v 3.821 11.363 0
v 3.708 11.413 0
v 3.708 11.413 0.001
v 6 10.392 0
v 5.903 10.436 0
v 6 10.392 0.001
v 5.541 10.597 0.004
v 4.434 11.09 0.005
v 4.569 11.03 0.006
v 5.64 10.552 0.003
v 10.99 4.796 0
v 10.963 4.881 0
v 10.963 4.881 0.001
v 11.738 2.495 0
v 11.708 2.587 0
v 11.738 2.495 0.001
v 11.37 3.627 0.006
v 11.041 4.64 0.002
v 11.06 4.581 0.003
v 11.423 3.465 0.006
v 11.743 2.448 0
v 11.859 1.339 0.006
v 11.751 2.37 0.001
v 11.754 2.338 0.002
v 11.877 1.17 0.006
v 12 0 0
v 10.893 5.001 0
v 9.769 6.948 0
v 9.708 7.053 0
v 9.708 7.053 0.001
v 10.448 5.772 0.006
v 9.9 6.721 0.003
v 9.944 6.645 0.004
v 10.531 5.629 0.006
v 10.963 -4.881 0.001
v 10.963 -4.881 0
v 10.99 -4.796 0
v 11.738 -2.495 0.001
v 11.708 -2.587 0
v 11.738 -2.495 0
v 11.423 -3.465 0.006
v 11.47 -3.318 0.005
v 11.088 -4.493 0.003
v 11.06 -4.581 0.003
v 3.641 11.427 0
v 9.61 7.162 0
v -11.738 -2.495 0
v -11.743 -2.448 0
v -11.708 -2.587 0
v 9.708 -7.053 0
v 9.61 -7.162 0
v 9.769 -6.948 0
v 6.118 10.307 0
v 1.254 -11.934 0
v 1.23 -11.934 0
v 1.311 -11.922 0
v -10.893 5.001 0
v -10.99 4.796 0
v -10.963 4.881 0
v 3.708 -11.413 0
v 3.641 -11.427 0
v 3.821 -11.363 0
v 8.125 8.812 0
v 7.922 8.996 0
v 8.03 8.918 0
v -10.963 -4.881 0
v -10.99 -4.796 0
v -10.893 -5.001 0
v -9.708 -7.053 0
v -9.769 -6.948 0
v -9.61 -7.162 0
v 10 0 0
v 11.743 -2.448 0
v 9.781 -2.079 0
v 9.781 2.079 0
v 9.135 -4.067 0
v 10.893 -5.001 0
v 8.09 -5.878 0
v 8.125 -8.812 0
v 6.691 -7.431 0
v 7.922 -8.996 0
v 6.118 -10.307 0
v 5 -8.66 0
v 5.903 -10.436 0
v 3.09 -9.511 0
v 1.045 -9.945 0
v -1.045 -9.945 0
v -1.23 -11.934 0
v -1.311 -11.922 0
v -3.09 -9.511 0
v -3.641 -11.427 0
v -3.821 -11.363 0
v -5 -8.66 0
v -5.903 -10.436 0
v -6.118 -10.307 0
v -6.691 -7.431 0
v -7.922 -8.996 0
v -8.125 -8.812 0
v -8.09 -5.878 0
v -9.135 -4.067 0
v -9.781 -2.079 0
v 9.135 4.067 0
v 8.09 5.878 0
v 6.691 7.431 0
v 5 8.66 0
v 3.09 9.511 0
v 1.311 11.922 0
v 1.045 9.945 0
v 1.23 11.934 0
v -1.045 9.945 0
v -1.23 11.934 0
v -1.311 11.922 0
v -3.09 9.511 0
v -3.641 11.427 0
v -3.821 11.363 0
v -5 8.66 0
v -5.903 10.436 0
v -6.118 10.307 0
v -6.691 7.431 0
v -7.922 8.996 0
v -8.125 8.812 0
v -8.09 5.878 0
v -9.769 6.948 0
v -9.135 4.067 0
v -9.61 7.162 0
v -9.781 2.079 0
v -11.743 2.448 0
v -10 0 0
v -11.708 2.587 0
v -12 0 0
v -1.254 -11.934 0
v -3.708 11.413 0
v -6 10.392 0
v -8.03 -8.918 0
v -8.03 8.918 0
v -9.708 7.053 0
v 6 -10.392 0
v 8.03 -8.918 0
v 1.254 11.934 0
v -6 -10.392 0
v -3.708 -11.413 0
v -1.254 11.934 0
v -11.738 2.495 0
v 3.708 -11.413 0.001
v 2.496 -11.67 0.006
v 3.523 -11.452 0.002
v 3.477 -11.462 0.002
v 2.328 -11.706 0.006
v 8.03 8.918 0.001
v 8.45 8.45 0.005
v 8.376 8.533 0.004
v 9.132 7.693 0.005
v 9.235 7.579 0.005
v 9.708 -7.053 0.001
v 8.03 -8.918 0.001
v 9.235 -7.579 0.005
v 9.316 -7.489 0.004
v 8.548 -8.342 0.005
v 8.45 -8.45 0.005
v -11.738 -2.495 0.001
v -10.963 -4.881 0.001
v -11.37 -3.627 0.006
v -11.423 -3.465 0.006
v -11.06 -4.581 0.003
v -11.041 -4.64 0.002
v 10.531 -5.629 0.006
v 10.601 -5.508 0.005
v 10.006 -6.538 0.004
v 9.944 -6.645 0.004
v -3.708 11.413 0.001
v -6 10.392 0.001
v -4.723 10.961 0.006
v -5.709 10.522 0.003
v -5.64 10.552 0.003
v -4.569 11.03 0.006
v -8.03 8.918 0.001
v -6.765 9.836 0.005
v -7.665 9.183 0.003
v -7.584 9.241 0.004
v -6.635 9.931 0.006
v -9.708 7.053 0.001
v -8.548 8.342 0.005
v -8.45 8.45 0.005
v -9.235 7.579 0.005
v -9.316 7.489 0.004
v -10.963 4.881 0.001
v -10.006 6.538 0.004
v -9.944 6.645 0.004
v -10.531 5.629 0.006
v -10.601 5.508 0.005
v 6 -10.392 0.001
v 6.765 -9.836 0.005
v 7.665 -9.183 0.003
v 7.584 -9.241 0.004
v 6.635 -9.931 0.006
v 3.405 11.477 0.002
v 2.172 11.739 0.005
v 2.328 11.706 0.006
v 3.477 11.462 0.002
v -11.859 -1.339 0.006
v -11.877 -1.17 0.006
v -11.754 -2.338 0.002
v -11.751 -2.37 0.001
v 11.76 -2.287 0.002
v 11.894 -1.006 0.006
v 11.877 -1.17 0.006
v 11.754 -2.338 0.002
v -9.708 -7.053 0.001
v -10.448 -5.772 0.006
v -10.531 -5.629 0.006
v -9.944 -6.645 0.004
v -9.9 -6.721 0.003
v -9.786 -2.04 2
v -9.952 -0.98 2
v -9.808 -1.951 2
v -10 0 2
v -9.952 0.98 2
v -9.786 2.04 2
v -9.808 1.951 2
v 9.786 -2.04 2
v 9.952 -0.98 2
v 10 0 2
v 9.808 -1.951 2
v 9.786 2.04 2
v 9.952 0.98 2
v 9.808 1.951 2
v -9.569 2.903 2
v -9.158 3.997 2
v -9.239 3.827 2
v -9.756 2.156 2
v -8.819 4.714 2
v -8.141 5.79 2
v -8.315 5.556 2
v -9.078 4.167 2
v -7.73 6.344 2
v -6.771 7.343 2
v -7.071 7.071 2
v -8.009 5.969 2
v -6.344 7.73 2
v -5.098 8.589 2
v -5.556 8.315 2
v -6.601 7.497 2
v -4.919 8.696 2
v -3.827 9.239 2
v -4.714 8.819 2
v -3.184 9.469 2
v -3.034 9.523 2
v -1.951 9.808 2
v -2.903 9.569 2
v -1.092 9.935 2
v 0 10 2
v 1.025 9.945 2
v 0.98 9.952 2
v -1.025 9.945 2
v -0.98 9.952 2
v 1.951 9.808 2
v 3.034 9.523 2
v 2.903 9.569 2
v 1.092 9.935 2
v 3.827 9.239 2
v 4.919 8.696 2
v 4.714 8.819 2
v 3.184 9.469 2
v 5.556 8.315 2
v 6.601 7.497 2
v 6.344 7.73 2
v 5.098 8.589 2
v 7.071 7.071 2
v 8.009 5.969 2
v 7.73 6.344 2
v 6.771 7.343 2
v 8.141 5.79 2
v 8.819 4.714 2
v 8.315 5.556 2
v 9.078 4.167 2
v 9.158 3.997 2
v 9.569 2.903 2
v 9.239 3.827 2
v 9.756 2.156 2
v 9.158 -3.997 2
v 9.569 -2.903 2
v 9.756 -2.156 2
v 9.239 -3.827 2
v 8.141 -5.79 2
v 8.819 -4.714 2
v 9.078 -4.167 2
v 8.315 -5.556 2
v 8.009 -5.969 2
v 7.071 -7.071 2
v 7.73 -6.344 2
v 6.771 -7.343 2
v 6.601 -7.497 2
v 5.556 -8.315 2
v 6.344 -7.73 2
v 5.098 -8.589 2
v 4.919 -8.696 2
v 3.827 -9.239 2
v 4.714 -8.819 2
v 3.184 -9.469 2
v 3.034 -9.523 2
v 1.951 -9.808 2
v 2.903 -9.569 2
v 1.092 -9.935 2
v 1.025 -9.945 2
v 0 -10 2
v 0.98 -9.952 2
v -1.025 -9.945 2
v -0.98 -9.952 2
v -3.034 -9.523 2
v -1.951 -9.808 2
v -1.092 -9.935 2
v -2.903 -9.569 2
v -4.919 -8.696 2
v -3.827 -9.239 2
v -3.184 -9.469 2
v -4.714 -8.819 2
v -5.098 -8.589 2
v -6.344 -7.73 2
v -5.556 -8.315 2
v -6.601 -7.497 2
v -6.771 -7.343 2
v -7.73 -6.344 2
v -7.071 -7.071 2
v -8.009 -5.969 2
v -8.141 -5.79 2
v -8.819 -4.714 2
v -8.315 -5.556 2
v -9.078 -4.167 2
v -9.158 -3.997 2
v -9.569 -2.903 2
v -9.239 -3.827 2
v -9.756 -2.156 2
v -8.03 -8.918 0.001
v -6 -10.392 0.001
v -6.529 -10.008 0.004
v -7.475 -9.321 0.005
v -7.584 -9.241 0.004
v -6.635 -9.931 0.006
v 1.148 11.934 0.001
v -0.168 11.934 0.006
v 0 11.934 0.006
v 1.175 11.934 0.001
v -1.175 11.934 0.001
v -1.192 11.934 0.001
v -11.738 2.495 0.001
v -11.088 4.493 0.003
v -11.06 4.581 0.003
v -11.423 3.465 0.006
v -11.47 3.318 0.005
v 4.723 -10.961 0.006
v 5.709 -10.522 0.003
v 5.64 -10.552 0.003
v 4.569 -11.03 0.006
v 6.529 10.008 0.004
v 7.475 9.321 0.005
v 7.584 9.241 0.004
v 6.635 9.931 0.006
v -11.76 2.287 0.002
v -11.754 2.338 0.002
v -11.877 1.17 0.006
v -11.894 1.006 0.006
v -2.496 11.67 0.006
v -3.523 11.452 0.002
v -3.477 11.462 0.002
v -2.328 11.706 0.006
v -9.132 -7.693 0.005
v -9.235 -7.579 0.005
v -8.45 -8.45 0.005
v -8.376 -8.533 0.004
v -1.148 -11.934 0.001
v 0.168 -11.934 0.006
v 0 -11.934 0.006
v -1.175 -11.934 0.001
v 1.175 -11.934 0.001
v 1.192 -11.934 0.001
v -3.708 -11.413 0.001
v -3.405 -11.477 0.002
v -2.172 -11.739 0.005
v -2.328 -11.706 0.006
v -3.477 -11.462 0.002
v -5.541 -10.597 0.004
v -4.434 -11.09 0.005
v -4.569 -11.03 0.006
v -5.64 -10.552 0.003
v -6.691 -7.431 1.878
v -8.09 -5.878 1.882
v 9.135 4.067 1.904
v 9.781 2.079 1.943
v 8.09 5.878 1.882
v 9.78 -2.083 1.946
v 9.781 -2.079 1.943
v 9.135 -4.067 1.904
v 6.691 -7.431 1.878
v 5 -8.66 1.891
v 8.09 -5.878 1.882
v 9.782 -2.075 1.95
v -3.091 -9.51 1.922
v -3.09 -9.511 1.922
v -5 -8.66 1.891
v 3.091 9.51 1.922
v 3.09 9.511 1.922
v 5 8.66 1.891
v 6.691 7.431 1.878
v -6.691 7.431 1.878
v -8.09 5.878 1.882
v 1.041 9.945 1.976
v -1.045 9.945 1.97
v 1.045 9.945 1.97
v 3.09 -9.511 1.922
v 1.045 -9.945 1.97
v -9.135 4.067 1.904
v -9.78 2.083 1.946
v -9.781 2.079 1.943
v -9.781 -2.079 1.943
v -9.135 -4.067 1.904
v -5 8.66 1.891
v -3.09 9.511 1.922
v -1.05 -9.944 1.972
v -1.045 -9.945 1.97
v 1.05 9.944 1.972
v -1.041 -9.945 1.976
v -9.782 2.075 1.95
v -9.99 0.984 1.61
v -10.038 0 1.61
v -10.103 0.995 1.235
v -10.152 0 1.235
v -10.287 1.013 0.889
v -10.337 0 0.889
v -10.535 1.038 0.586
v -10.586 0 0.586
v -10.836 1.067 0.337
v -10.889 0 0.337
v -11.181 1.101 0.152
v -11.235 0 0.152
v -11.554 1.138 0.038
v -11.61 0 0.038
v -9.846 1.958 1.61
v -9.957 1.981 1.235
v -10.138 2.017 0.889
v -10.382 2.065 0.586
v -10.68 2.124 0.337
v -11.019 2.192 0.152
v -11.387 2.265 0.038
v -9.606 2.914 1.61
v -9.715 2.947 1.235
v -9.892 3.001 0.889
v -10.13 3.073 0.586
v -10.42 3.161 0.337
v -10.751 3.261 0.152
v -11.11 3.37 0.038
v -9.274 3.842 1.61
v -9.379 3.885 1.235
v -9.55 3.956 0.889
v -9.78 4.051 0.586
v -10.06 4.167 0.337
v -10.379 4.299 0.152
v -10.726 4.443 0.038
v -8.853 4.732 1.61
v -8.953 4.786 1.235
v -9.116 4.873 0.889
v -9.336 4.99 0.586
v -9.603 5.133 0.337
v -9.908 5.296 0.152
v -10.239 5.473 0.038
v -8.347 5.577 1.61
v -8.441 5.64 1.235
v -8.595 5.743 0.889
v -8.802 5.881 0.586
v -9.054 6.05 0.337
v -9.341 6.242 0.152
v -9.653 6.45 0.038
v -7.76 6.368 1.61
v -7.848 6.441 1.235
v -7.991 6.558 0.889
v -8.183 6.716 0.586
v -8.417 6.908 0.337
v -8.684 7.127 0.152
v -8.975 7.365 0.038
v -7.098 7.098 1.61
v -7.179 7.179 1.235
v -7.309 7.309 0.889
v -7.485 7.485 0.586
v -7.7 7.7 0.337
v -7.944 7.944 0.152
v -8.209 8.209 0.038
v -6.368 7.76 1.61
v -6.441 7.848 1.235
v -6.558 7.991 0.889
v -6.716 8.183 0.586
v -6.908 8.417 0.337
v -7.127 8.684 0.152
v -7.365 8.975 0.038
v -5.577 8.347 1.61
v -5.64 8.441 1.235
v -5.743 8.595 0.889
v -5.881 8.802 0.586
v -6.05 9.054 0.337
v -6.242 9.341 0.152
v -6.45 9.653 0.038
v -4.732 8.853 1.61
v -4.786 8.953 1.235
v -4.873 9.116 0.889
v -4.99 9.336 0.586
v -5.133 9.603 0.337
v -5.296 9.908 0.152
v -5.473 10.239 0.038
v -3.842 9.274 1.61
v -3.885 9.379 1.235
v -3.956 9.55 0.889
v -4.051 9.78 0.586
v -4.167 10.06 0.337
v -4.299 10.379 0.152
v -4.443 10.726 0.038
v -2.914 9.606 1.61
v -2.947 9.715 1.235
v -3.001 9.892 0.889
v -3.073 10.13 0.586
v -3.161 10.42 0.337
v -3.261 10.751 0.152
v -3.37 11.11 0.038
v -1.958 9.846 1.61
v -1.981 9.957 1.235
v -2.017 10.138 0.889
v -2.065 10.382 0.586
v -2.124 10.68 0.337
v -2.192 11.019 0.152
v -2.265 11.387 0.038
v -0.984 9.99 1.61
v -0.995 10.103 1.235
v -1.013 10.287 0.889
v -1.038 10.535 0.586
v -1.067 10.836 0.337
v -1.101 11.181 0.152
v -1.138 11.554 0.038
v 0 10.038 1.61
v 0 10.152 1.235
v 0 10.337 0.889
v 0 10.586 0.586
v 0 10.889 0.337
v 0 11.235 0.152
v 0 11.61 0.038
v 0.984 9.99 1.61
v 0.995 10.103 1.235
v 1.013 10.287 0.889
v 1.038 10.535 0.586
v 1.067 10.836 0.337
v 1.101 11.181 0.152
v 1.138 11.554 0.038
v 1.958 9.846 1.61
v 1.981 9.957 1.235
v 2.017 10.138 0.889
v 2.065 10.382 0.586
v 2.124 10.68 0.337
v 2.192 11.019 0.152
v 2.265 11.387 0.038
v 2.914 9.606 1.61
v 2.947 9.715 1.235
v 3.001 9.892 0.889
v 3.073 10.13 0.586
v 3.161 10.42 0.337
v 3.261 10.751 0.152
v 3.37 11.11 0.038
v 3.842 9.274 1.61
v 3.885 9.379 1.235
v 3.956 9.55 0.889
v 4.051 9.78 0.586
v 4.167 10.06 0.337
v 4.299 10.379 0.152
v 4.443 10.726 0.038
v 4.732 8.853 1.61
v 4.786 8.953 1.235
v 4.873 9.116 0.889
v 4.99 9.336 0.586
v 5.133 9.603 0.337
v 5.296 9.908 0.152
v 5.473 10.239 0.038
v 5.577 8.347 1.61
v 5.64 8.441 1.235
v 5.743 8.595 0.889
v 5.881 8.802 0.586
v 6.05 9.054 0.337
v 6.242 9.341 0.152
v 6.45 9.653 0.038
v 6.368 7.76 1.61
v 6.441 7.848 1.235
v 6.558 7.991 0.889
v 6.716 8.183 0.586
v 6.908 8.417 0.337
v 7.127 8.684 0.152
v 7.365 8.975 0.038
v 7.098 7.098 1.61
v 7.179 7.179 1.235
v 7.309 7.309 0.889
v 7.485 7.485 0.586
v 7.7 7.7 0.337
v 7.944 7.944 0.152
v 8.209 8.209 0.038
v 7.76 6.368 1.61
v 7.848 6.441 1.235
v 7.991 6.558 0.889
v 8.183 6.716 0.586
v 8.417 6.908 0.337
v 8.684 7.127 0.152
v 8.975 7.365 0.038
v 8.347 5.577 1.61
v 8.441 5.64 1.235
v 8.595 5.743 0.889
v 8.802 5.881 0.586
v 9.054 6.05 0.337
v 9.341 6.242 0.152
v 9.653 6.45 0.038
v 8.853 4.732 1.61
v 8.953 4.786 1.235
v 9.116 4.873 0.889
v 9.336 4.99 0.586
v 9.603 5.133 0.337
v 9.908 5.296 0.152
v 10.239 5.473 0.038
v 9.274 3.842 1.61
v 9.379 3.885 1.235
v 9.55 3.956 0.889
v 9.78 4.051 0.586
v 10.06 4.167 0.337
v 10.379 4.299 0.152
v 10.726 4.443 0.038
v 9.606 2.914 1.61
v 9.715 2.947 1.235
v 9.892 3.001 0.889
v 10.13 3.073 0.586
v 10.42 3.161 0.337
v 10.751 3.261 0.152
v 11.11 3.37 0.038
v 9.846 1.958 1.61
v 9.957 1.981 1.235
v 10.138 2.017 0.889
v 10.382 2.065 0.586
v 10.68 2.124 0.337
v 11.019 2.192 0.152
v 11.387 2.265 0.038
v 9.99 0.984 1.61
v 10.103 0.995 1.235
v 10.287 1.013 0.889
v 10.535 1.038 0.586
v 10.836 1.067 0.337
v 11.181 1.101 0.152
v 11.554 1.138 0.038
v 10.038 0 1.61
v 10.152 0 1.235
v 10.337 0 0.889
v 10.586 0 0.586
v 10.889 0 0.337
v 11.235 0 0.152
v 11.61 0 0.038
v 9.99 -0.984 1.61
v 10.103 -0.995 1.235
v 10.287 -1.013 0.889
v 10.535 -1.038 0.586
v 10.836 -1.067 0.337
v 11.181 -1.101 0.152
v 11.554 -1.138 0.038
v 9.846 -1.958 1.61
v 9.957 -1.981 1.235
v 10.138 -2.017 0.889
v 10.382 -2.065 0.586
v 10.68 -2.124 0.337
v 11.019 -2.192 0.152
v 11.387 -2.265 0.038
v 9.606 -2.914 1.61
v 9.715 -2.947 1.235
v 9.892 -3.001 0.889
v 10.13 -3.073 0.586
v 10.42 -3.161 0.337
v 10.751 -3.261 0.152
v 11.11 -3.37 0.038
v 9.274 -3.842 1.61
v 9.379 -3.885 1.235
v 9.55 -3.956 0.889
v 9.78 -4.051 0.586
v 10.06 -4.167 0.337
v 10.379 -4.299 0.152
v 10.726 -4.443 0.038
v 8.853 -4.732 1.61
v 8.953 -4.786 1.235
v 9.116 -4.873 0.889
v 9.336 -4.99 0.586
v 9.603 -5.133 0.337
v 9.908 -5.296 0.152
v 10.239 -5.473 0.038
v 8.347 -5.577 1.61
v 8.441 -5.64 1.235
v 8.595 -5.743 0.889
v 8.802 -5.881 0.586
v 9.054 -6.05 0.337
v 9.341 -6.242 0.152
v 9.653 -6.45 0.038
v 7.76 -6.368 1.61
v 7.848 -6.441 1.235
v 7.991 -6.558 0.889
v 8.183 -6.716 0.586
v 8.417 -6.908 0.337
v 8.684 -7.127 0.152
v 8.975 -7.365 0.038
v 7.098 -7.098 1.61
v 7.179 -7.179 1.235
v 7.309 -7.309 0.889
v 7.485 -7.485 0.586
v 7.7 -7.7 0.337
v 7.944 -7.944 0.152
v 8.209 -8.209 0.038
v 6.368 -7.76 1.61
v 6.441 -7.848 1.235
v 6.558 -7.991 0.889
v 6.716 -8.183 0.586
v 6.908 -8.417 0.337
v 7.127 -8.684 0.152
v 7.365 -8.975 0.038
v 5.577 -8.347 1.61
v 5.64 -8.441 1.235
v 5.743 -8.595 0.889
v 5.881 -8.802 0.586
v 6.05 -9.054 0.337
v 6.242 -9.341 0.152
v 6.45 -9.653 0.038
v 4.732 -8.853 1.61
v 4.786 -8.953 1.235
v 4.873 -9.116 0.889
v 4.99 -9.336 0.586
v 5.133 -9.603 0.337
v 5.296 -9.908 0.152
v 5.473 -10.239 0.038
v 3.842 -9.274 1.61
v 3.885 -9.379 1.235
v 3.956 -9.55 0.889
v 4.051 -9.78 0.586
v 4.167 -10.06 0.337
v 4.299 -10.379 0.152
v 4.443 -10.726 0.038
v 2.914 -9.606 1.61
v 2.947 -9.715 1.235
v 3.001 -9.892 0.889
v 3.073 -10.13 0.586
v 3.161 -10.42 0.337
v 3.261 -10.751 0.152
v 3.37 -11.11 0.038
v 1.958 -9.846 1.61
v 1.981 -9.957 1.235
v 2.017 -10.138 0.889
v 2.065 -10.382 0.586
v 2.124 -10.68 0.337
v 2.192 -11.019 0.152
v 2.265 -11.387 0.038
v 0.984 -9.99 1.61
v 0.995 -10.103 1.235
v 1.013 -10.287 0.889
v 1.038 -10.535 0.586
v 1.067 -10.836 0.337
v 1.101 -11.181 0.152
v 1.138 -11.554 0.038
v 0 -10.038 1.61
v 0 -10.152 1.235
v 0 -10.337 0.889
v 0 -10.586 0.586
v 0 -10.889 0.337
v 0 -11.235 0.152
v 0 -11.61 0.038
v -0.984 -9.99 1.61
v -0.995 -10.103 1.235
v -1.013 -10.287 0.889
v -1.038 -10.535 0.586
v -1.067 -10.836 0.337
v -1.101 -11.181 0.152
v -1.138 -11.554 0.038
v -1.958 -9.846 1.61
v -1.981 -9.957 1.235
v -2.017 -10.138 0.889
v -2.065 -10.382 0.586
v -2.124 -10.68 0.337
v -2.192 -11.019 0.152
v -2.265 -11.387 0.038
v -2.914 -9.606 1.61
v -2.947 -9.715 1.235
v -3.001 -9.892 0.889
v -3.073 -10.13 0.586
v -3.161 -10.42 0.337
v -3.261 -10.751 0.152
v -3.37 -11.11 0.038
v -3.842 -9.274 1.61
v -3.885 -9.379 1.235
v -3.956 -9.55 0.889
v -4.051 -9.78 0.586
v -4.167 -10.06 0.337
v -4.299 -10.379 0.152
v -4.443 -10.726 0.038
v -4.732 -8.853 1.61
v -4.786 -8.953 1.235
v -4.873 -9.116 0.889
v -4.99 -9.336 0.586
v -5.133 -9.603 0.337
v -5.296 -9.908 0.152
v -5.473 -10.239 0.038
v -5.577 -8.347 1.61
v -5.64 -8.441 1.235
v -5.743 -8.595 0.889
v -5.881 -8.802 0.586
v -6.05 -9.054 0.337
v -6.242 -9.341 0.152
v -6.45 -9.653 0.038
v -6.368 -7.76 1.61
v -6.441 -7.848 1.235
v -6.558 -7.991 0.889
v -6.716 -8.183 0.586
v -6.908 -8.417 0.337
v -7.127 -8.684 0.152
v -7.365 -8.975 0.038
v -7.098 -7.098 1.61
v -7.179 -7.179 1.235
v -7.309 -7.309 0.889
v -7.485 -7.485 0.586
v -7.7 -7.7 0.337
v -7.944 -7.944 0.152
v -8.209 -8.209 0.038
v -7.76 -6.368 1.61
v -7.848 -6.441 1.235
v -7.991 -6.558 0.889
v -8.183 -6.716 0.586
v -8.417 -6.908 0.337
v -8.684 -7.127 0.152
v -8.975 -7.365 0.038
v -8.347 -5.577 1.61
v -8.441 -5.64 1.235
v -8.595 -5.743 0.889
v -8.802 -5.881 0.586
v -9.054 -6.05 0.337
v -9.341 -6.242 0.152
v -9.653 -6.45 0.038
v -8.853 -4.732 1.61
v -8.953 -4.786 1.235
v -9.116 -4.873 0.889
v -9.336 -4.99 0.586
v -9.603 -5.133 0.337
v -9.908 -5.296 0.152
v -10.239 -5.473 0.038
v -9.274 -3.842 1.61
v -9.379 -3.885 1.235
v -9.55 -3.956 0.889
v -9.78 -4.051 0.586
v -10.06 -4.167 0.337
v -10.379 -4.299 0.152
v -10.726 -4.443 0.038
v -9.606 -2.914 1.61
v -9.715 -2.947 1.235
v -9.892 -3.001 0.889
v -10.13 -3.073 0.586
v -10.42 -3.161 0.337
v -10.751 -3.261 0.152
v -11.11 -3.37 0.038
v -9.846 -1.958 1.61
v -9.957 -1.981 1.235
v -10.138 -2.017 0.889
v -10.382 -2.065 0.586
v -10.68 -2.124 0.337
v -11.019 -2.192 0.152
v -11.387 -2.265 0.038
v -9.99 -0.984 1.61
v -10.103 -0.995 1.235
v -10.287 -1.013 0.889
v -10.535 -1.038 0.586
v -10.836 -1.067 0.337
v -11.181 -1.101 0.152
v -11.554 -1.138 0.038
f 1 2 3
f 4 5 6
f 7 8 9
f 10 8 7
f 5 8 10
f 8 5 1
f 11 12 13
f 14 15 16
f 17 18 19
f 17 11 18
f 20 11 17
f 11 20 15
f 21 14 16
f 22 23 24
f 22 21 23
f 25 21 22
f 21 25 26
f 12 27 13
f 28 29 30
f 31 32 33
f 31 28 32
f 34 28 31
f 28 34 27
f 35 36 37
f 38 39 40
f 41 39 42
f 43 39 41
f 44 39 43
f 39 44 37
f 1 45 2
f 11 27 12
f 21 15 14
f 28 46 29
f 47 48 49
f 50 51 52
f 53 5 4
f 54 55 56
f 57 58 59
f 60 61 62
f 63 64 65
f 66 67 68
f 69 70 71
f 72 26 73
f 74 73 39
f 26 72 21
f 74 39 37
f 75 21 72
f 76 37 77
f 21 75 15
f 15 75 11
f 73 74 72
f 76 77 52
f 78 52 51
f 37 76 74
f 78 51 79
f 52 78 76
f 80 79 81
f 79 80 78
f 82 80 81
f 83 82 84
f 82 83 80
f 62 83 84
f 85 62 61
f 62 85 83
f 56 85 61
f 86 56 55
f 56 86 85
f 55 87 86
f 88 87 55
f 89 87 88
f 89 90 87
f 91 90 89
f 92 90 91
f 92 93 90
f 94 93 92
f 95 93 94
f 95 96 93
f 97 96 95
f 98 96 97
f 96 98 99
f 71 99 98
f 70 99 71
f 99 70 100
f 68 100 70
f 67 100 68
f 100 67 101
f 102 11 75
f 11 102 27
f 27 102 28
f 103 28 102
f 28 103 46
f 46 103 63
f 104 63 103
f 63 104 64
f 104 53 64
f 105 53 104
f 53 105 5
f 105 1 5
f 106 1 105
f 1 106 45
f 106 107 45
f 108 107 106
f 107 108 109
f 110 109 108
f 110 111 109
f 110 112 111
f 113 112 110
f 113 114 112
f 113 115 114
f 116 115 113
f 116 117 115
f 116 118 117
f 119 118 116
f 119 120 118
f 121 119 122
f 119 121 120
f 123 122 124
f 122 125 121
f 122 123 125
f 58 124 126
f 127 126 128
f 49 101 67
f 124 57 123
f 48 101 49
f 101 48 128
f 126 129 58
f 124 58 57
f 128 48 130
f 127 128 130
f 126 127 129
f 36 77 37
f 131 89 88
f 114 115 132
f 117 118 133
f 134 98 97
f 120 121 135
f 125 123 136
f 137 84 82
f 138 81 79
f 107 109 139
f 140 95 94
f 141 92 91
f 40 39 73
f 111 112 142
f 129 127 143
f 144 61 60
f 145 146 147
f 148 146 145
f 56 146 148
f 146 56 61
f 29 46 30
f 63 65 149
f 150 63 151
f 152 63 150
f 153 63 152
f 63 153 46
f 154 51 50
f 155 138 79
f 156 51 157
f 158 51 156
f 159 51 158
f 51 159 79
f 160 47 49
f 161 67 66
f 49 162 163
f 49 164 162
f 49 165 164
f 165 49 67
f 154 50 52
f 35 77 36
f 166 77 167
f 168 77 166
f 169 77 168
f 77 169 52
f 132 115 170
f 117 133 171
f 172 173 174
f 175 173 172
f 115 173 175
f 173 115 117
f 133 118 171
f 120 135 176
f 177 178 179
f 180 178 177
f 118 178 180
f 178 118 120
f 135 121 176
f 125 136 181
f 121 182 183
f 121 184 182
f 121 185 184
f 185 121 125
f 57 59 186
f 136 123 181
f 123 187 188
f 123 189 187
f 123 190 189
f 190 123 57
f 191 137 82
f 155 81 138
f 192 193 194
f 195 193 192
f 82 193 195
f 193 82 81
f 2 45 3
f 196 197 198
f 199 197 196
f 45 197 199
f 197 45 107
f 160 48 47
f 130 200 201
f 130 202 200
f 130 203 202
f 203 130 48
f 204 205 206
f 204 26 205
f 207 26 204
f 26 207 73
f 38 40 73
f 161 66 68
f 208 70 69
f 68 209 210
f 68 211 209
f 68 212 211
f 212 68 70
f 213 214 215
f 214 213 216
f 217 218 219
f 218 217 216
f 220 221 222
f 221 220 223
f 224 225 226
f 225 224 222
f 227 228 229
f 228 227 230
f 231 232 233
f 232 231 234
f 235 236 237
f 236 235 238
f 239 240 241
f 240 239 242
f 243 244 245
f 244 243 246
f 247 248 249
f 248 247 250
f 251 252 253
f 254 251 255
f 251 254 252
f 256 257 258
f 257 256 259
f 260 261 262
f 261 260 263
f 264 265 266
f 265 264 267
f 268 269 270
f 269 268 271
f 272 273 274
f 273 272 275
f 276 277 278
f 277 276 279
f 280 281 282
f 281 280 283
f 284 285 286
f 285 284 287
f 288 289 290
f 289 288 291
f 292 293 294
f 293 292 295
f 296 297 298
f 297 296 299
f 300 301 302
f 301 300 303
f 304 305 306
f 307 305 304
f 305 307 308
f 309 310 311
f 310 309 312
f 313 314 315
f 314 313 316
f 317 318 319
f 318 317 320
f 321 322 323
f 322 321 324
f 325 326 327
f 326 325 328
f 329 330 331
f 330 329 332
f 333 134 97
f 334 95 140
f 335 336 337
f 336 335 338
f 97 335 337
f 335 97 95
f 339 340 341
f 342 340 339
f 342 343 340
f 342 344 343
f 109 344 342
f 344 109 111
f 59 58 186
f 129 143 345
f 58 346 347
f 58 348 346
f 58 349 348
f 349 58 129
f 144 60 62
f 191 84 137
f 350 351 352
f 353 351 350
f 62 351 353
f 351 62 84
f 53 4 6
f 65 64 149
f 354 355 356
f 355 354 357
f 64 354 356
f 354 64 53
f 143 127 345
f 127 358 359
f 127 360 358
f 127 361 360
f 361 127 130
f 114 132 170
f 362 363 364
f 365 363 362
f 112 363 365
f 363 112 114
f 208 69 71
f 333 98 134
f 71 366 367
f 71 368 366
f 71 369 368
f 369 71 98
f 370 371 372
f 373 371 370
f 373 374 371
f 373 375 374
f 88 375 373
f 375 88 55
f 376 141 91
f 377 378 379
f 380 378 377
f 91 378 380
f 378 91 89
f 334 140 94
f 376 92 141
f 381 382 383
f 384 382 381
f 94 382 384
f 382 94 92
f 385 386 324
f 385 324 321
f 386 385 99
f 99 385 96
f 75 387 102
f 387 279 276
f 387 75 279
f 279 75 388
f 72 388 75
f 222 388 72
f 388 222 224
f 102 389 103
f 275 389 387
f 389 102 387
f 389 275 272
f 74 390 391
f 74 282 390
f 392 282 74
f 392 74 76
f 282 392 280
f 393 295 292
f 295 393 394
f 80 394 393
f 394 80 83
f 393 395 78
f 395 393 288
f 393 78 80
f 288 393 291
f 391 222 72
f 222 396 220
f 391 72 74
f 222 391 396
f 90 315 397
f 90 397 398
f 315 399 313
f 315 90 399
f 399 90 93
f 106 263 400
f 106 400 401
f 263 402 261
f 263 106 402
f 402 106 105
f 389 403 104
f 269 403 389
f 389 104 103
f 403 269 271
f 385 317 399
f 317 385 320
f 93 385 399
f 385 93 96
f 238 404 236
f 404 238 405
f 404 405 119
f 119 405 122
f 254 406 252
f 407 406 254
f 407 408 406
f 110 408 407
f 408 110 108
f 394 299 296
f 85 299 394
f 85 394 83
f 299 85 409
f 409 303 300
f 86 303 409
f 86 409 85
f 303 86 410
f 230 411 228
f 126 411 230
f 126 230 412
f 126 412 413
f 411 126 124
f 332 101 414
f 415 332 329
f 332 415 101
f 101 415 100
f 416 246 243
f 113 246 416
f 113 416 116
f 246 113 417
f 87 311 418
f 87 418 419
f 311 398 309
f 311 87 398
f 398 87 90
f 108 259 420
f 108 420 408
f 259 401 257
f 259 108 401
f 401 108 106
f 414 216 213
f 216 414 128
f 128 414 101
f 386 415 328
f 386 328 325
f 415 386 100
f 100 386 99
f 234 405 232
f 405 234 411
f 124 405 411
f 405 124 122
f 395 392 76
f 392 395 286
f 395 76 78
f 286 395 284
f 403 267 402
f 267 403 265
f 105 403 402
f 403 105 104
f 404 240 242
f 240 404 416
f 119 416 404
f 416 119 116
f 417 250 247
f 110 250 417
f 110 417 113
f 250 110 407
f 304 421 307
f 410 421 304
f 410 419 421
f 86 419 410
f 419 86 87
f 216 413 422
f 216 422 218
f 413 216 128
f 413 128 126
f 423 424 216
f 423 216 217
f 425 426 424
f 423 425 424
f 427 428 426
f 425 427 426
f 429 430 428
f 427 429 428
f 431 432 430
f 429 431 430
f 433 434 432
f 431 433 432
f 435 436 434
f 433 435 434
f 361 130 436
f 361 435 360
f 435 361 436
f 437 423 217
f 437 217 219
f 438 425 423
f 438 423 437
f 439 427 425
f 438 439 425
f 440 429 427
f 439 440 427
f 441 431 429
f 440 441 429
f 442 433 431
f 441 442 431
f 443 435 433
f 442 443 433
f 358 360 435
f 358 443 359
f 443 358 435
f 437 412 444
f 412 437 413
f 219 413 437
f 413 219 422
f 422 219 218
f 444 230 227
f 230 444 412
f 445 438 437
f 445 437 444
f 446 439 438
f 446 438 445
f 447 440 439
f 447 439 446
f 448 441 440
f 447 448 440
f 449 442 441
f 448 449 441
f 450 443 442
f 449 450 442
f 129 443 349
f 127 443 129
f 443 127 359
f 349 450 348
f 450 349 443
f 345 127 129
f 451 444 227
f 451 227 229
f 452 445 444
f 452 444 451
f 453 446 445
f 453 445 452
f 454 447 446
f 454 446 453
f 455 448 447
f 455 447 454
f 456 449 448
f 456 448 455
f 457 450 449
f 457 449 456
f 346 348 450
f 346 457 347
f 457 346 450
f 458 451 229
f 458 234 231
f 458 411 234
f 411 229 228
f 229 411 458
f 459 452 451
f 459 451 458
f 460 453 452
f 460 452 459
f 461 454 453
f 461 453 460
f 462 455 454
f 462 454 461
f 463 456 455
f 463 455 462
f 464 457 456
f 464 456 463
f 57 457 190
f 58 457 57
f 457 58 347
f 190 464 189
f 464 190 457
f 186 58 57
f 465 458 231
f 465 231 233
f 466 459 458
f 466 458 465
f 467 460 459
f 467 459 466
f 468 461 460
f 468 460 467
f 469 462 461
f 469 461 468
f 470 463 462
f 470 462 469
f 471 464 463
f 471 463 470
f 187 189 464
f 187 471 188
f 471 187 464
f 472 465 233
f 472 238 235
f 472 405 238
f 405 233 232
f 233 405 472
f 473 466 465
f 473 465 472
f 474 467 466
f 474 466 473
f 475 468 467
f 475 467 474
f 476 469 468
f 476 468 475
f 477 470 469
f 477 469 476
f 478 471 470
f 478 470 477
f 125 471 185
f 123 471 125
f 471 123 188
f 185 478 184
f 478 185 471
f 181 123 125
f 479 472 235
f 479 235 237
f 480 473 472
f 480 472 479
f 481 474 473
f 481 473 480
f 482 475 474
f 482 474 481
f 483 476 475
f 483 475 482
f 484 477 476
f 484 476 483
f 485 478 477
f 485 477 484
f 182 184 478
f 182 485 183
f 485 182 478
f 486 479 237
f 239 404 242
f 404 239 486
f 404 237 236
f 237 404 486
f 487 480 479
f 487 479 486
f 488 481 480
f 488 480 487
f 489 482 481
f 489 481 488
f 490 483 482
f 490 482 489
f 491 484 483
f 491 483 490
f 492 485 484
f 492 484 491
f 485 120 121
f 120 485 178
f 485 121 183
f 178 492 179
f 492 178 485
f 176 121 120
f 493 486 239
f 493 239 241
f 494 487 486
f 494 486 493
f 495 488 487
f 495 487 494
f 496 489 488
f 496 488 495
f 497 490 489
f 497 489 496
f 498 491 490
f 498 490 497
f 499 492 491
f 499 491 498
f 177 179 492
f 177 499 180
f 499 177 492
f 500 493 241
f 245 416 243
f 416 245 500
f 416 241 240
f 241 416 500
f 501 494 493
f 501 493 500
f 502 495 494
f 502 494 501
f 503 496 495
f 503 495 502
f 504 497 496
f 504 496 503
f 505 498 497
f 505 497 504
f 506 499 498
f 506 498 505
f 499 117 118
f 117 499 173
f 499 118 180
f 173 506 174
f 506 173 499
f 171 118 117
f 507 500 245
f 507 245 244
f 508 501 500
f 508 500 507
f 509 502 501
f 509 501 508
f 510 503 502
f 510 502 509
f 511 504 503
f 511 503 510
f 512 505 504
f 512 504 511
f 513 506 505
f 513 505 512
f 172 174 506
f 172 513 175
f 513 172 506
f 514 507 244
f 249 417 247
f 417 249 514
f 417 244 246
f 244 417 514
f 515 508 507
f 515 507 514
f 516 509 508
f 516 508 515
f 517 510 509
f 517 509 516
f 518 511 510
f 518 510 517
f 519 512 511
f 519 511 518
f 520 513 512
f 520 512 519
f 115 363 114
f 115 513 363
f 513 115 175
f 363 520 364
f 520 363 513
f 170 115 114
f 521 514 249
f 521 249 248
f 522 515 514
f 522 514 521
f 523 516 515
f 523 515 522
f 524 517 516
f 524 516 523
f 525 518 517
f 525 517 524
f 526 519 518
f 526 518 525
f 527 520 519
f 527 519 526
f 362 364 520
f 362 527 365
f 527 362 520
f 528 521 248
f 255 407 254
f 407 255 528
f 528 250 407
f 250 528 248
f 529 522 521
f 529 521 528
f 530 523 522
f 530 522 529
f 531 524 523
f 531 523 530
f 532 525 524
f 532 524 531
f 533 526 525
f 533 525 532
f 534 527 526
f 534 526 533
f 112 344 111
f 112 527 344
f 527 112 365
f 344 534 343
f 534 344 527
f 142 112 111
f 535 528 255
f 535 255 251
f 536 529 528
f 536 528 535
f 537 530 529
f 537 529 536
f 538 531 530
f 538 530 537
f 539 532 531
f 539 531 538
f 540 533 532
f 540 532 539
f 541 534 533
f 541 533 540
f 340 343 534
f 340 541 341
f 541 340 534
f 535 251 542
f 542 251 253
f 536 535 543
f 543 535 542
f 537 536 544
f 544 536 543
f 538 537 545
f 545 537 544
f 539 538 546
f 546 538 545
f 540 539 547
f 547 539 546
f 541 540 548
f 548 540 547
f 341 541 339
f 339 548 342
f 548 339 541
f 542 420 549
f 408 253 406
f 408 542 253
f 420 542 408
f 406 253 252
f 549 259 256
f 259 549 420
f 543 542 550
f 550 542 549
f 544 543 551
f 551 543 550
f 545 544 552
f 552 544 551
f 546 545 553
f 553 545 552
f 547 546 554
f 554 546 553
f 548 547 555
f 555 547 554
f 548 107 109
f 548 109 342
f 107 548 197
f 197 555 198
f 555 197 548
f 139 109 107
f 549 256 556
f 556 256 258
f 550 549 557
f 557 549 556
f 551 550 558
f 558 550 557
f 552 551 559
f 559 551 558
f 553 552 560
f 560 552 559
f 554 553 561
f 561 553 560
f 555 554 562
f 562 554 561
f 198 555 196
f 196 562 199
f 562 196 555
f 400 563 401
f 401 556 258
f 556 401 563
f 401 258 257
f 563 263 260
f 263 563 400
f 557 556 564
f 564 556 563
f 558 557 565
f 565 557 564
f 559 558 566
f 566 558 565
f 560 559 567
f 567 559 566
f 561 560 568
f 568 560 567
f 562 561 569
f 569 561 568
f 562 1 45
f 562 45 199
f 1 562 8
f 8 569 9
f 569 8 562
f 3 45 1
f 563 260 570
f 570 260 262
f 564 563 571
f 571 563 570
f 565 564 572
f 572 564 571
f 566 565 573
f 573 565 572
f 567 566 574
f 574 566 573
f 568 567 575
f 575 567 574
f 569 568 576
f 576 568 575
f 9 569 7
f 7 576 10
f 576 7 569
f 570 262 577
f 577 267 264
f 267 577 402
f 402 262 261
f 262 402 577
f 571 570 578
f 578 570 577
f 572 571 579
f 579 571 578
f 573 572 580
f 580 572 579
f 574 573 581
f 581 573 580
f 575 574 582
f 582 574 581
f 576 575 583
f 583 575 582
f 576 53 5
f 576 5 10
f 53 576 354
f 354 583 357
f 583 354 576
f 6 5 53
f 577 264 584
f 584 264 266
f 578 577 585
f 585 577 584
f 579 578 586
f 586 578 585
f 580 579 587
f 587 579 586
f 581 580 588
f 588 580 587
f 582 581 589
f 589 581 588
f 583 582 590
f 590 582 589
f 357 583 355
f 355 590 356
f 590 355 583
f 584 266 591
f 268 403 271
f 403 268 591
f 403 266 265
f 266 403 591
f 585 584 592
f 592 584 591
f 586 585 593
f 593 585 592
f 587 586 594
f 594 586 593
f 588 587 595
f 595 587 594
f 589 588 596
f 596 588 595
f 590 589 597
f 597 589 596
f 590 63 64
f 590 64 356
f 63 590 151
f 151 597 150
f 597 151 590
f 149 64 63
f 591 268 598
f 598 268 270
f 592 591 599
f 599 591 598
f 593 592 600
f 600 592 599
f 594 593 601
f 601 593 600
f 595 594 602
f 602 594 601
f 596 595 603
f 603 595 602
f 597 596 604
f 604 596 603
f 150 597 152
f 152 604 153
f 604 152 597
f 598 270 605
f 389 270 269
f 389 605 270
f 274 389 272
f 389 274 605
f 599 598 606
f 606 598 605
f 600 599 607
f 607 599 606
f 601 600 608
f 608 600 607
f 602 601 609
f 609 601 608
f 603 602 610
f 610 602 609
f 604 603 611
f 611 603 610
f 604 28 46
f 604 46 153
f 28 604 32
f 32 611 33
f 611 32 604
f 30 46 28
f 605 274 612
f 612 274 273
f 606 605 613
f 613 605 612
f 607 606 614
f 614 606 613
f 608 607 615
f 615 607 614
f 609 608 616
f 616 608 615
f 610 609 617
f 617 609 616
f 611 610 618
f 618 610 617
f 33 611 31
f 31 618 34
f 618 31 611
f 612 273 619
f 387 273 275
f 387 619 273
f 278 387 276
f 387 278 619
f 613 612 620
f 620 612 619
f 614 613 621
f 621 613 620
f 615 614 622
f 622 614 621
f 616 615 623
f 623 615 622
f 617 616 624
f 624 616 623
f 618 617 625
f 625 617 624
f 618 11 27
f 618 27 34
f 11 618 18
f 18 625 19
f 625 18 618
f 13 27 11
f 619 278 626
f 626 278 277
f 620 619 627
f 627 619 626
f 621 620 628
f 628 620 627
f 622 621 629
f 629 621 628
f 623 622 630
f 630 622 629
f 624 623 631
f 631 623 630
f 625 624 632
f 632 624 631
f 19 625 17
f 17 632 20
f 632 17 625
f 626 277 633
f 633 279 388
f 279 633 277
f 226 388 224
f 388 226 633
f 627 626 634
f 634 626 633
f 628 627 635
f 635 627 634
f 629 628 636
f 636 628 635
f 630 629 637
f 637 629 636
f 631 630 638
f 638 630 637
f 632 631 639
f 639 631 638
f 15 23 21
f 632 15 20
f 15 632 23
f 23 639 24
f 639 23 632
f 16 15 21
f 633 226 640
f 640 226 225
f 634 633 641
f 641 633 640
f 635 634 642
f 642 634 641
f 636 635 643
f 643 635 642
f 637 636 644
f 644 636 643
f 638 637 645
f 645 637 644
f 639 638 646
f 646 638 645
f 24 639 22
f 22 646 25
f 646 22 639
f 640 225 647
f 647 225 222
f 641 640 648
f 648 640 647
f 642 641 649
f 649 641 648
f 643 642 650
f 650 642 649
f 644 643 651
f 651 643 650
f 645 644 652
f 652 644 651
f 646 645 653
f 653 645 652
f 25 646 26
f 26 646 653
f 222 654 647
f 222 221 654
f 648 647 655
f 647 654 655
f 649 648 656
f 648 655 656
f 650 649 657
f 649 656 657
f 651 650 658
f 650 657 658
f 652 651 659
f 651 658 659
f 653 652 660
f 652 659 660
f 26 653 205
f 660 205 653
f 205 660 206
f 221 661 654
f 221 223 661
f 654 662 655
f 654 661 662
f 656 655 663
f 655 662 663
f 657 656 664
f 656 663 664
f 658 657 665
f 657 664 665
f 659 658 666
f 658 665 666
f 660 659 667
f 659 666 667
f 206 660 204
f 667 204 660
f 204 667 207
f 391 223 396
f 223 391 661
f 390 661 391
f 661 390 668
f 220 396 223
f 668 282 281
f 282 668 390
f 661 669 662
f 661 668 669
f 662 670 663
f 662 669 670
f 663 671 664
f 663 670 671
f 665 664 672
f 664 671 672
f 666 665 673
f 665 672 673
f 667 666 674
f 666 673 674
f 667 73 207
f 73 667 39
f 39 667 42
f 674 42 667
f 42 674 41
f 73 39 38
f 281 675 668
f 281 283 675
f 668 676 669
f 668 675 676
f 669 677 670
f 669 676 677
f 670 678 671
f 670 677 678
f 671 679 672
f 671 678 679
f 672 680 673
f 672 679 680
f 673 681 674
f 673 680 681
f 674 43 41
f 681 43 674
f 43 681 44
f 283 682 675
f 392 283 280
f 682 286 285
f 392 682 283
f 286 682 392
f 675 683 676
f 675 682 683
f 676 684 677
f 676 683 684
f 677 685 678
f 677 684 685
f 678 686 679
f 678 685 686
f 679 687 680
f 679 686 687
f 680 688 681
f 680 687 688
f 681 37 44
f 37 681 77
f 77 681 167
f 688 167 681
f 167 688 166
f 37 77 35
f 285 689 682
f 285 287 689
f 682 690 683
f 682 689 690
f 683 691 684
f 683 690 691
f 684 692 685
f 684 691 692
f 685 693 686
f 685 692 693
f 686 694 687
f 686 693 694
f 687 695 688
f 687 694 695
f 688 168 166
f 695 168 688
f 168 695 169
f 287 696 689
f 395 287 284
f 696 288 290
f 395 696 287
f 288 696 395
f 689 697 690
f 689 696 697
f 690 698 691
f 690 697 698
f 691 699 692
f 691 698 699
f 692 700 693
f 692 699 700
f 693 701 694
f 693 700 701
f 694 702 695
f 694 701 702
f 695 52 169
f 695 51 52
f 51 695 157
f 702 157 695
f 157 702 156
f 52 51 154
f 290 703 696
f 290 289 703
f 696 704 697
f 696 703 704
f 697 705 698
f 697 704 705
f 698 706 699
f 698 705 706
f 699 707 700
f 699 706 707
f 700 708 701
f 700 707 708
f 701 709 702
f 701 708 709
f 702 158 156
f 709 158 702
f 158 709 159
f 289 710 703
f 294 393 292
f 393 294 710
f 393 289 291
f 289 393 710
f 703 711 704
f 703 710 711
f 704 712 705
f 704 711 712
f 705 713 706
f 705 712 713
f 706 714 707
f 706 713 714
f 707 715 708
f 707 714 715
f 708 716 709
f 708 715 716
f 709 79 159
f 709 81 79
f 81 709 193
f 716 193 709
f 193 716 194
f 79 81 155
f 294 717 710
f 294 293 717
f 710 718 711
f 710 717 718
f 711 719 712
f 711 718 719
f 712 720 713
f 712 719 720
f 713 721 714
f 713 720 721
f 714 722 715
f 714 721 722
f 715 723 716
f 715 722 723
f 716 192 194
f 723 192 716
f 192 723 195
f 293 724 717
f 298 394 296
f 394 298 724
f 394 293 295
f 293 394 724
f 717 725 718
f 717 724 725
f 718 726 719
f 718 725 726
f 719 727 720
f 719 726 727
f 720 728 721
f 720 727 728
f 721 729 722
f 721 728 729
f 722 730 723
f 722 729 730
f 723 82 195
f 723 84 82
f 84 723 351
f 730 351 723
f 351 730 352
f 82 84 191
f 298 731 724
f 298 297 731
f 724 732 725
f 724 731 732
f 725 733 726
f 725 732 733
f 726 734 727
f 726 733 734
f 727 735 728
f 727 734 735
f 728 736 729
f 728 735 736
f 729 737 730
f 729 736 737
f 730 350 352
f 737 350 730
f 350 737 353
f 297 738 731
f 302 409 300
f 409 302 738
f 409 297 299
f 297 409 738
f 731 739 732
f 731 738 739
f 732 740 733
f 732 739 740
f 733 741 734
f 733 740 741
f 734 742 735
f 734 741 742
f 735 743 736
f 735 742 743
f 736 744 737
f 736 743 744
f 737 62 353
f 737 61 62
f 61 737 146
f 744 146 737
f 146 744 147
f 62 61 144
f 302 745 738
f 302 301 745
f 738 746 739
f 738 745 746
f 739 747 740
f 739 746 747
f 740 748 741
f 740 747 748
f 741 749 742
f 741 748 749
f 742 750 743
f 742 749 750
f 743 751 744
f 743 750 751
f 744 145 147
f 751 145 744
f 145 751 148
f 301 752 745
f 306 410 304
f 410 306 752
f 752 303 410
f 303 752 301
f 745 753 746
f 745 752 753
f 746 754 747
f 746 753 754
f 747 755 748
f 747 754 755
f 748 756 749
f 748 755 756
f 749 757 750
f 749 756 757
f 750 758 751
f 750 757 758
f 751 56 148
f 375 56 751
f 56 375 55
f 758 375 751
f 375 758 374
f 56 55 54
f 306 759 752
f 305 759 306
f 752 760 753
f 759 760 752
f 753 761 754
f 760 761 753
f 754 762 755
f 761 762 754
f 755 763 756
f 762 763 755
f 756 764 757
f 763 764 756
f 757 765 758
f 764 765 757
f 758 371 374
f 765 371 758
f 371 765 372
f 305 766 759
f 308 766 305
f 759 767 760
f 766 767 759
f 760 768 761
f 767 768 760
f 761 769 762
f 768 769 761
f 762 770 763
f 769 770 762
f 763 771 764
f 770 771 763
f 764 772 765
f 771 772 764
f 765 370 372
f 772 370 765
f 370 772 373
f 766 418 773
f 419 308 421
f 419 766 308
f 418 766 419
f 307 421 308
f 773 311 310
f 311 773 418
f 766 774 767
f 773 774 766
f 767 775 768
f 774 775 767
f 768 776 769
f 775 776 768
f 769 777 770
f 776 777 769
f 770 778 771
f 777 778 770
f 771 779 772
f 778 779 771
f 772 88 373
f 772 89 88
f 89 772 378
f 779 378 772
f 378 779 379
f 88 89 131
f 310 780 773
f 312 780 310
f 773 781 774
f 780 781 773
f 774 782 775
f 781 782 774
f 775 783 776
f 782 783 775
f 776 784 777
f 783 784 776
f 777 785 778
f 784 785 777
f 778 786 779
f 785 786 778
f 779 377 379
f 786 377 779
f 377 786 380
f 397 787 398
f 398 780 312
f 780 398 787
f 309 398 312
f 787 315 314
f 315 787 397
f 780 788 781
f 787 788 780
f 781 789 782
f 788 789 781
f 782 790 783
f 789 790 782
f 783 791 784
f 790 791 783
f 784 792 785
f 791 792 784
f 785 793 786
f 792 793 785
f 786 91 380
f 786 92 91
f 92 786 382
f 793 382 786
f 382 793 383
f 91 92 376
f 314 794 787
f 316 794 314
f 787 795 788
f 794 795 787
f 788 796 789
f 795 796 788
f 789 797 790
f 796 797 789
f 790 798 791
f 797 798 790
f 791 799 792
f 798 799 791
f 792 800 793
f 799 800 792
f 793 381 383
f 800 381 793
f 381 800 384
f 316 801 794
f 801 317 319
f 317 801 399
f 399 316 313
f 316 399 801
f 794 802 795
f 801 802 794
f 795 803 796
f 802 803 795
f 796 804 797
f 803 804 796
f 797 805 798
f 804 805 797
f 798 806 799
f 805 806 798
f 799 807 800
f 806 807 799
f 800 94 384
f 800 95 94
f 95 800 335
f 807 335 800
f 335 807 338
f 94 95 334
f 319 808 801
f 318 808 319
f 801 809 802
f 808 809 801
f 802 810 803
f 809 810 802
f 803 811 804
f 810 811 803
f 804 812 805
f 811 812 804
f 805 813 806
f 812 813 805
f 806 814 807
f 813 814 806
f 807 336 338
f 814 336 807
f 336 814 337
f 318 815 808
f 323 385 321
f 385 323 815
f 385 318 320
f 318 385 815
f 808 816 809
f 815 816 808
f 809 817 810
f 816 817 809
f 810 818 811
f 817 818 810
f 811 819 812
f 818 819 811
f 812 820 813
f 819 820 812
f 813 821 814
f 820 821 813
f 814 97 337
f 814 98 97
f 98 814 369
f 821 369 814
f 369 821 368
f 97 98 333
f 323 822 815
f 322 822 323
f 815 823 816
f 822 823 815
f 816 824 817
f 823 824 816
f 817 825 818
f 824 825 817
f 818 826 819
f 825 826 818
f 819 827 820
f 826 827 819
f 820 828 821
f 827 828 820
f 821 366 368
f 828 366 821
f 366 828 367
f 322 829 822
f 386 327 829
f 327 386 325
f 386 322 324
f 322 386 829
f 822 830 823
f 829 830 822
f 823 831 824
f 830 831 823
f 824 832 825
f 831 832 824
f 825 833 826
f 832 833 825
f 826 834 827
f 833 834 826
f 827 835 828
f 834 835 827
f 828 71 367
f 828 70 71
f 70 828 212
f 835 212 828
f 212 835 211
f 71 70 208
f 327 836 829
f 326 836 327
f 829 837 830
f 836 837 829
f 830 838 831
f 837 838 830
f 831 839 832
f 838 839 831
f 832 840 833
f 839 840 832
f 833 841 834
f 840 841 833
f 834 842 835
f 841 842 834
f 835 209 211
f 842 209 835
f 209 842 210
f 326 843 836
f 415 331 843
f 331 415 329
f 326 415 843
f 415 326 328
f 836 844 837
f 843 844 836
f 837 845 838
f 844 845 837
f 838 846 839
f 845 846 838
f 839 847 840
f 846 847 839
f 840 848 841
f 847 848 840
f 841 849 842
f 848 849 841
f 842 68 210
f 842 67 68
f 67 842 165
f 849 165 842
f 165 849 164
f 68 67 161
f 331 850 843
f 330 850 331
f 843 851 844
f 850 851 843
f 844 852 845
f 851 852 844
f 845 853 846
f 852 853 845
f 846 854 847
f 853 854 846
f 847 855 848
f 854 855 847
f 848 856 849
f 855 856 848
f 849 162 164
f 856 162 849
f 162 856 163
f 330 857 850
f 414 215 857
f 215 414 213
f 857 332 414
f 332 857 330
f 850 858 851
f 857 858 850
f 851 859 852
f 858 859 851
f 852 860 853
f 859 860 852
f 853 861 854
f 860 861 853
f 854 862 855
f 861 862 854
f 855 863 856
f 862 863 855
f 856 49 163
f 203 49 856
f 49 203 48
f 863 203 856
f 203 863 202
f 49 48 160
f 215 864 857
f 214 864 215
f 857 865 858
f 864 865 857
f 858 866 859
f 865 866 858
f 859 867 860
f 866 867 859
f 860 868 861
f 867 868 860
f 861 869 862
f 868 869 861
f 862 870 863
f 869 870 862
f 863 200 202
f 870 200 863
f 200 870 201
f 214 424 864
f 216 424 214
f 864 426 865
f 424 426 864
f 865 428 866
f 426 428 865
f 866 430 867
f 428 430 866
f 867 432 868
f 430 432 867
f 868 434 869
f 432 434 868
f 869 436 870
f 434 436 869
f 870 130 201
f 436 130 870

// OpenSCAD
// file: Torus.scad
// Torus.scad

module torus(ir, rr) {
	// Torus centred on origin.
	//
	// ir 		inside (hole) radius
	// rr 		rim radius
	//
	rotate_extrude($fn=64) {
		translate([ir+rr,0,0])
			circle(r=rr, $fn=32) ;
	}
}

//torus(20, 10);
// file: Tube.scad
// Tube.scad

delta = 0.01 ;

module tube(id, od, l) {
    // Tube aligned along Z axis, standing on X-Y plane, centred on origin
    //
    // id = inside diamater
    // od = outside diameter
    // l  = length (height)
    difference() {
        cylinder(d=od, h=l) ;
        translate([0,0,-delta])
            cylinder(d=id, h=l+2*delta) ;
    }
}
// main file
// CircularFillet.scad
//

use <Tube.scad>
use <Torus.scad>

module circular_outside_fillet(d, fr) {
    // Circular radiused fillet, for example around where a cylinder meets a plate
    // The fillet lies on the X-Y plane, centred on the origin, and faces upwards
    //
    // d  = diameter of the circular edge to be filleted
    // fr = fillet radius to use
    //
    difference() {
        tube(id=d, od=d+fr*2, l=fr) ;
        translate([0,0,fr])
            torus(ir=d/2, rr=fr) ;
    }
}


// Example
circular_outside_fillet(d=20,fr=2) ;
